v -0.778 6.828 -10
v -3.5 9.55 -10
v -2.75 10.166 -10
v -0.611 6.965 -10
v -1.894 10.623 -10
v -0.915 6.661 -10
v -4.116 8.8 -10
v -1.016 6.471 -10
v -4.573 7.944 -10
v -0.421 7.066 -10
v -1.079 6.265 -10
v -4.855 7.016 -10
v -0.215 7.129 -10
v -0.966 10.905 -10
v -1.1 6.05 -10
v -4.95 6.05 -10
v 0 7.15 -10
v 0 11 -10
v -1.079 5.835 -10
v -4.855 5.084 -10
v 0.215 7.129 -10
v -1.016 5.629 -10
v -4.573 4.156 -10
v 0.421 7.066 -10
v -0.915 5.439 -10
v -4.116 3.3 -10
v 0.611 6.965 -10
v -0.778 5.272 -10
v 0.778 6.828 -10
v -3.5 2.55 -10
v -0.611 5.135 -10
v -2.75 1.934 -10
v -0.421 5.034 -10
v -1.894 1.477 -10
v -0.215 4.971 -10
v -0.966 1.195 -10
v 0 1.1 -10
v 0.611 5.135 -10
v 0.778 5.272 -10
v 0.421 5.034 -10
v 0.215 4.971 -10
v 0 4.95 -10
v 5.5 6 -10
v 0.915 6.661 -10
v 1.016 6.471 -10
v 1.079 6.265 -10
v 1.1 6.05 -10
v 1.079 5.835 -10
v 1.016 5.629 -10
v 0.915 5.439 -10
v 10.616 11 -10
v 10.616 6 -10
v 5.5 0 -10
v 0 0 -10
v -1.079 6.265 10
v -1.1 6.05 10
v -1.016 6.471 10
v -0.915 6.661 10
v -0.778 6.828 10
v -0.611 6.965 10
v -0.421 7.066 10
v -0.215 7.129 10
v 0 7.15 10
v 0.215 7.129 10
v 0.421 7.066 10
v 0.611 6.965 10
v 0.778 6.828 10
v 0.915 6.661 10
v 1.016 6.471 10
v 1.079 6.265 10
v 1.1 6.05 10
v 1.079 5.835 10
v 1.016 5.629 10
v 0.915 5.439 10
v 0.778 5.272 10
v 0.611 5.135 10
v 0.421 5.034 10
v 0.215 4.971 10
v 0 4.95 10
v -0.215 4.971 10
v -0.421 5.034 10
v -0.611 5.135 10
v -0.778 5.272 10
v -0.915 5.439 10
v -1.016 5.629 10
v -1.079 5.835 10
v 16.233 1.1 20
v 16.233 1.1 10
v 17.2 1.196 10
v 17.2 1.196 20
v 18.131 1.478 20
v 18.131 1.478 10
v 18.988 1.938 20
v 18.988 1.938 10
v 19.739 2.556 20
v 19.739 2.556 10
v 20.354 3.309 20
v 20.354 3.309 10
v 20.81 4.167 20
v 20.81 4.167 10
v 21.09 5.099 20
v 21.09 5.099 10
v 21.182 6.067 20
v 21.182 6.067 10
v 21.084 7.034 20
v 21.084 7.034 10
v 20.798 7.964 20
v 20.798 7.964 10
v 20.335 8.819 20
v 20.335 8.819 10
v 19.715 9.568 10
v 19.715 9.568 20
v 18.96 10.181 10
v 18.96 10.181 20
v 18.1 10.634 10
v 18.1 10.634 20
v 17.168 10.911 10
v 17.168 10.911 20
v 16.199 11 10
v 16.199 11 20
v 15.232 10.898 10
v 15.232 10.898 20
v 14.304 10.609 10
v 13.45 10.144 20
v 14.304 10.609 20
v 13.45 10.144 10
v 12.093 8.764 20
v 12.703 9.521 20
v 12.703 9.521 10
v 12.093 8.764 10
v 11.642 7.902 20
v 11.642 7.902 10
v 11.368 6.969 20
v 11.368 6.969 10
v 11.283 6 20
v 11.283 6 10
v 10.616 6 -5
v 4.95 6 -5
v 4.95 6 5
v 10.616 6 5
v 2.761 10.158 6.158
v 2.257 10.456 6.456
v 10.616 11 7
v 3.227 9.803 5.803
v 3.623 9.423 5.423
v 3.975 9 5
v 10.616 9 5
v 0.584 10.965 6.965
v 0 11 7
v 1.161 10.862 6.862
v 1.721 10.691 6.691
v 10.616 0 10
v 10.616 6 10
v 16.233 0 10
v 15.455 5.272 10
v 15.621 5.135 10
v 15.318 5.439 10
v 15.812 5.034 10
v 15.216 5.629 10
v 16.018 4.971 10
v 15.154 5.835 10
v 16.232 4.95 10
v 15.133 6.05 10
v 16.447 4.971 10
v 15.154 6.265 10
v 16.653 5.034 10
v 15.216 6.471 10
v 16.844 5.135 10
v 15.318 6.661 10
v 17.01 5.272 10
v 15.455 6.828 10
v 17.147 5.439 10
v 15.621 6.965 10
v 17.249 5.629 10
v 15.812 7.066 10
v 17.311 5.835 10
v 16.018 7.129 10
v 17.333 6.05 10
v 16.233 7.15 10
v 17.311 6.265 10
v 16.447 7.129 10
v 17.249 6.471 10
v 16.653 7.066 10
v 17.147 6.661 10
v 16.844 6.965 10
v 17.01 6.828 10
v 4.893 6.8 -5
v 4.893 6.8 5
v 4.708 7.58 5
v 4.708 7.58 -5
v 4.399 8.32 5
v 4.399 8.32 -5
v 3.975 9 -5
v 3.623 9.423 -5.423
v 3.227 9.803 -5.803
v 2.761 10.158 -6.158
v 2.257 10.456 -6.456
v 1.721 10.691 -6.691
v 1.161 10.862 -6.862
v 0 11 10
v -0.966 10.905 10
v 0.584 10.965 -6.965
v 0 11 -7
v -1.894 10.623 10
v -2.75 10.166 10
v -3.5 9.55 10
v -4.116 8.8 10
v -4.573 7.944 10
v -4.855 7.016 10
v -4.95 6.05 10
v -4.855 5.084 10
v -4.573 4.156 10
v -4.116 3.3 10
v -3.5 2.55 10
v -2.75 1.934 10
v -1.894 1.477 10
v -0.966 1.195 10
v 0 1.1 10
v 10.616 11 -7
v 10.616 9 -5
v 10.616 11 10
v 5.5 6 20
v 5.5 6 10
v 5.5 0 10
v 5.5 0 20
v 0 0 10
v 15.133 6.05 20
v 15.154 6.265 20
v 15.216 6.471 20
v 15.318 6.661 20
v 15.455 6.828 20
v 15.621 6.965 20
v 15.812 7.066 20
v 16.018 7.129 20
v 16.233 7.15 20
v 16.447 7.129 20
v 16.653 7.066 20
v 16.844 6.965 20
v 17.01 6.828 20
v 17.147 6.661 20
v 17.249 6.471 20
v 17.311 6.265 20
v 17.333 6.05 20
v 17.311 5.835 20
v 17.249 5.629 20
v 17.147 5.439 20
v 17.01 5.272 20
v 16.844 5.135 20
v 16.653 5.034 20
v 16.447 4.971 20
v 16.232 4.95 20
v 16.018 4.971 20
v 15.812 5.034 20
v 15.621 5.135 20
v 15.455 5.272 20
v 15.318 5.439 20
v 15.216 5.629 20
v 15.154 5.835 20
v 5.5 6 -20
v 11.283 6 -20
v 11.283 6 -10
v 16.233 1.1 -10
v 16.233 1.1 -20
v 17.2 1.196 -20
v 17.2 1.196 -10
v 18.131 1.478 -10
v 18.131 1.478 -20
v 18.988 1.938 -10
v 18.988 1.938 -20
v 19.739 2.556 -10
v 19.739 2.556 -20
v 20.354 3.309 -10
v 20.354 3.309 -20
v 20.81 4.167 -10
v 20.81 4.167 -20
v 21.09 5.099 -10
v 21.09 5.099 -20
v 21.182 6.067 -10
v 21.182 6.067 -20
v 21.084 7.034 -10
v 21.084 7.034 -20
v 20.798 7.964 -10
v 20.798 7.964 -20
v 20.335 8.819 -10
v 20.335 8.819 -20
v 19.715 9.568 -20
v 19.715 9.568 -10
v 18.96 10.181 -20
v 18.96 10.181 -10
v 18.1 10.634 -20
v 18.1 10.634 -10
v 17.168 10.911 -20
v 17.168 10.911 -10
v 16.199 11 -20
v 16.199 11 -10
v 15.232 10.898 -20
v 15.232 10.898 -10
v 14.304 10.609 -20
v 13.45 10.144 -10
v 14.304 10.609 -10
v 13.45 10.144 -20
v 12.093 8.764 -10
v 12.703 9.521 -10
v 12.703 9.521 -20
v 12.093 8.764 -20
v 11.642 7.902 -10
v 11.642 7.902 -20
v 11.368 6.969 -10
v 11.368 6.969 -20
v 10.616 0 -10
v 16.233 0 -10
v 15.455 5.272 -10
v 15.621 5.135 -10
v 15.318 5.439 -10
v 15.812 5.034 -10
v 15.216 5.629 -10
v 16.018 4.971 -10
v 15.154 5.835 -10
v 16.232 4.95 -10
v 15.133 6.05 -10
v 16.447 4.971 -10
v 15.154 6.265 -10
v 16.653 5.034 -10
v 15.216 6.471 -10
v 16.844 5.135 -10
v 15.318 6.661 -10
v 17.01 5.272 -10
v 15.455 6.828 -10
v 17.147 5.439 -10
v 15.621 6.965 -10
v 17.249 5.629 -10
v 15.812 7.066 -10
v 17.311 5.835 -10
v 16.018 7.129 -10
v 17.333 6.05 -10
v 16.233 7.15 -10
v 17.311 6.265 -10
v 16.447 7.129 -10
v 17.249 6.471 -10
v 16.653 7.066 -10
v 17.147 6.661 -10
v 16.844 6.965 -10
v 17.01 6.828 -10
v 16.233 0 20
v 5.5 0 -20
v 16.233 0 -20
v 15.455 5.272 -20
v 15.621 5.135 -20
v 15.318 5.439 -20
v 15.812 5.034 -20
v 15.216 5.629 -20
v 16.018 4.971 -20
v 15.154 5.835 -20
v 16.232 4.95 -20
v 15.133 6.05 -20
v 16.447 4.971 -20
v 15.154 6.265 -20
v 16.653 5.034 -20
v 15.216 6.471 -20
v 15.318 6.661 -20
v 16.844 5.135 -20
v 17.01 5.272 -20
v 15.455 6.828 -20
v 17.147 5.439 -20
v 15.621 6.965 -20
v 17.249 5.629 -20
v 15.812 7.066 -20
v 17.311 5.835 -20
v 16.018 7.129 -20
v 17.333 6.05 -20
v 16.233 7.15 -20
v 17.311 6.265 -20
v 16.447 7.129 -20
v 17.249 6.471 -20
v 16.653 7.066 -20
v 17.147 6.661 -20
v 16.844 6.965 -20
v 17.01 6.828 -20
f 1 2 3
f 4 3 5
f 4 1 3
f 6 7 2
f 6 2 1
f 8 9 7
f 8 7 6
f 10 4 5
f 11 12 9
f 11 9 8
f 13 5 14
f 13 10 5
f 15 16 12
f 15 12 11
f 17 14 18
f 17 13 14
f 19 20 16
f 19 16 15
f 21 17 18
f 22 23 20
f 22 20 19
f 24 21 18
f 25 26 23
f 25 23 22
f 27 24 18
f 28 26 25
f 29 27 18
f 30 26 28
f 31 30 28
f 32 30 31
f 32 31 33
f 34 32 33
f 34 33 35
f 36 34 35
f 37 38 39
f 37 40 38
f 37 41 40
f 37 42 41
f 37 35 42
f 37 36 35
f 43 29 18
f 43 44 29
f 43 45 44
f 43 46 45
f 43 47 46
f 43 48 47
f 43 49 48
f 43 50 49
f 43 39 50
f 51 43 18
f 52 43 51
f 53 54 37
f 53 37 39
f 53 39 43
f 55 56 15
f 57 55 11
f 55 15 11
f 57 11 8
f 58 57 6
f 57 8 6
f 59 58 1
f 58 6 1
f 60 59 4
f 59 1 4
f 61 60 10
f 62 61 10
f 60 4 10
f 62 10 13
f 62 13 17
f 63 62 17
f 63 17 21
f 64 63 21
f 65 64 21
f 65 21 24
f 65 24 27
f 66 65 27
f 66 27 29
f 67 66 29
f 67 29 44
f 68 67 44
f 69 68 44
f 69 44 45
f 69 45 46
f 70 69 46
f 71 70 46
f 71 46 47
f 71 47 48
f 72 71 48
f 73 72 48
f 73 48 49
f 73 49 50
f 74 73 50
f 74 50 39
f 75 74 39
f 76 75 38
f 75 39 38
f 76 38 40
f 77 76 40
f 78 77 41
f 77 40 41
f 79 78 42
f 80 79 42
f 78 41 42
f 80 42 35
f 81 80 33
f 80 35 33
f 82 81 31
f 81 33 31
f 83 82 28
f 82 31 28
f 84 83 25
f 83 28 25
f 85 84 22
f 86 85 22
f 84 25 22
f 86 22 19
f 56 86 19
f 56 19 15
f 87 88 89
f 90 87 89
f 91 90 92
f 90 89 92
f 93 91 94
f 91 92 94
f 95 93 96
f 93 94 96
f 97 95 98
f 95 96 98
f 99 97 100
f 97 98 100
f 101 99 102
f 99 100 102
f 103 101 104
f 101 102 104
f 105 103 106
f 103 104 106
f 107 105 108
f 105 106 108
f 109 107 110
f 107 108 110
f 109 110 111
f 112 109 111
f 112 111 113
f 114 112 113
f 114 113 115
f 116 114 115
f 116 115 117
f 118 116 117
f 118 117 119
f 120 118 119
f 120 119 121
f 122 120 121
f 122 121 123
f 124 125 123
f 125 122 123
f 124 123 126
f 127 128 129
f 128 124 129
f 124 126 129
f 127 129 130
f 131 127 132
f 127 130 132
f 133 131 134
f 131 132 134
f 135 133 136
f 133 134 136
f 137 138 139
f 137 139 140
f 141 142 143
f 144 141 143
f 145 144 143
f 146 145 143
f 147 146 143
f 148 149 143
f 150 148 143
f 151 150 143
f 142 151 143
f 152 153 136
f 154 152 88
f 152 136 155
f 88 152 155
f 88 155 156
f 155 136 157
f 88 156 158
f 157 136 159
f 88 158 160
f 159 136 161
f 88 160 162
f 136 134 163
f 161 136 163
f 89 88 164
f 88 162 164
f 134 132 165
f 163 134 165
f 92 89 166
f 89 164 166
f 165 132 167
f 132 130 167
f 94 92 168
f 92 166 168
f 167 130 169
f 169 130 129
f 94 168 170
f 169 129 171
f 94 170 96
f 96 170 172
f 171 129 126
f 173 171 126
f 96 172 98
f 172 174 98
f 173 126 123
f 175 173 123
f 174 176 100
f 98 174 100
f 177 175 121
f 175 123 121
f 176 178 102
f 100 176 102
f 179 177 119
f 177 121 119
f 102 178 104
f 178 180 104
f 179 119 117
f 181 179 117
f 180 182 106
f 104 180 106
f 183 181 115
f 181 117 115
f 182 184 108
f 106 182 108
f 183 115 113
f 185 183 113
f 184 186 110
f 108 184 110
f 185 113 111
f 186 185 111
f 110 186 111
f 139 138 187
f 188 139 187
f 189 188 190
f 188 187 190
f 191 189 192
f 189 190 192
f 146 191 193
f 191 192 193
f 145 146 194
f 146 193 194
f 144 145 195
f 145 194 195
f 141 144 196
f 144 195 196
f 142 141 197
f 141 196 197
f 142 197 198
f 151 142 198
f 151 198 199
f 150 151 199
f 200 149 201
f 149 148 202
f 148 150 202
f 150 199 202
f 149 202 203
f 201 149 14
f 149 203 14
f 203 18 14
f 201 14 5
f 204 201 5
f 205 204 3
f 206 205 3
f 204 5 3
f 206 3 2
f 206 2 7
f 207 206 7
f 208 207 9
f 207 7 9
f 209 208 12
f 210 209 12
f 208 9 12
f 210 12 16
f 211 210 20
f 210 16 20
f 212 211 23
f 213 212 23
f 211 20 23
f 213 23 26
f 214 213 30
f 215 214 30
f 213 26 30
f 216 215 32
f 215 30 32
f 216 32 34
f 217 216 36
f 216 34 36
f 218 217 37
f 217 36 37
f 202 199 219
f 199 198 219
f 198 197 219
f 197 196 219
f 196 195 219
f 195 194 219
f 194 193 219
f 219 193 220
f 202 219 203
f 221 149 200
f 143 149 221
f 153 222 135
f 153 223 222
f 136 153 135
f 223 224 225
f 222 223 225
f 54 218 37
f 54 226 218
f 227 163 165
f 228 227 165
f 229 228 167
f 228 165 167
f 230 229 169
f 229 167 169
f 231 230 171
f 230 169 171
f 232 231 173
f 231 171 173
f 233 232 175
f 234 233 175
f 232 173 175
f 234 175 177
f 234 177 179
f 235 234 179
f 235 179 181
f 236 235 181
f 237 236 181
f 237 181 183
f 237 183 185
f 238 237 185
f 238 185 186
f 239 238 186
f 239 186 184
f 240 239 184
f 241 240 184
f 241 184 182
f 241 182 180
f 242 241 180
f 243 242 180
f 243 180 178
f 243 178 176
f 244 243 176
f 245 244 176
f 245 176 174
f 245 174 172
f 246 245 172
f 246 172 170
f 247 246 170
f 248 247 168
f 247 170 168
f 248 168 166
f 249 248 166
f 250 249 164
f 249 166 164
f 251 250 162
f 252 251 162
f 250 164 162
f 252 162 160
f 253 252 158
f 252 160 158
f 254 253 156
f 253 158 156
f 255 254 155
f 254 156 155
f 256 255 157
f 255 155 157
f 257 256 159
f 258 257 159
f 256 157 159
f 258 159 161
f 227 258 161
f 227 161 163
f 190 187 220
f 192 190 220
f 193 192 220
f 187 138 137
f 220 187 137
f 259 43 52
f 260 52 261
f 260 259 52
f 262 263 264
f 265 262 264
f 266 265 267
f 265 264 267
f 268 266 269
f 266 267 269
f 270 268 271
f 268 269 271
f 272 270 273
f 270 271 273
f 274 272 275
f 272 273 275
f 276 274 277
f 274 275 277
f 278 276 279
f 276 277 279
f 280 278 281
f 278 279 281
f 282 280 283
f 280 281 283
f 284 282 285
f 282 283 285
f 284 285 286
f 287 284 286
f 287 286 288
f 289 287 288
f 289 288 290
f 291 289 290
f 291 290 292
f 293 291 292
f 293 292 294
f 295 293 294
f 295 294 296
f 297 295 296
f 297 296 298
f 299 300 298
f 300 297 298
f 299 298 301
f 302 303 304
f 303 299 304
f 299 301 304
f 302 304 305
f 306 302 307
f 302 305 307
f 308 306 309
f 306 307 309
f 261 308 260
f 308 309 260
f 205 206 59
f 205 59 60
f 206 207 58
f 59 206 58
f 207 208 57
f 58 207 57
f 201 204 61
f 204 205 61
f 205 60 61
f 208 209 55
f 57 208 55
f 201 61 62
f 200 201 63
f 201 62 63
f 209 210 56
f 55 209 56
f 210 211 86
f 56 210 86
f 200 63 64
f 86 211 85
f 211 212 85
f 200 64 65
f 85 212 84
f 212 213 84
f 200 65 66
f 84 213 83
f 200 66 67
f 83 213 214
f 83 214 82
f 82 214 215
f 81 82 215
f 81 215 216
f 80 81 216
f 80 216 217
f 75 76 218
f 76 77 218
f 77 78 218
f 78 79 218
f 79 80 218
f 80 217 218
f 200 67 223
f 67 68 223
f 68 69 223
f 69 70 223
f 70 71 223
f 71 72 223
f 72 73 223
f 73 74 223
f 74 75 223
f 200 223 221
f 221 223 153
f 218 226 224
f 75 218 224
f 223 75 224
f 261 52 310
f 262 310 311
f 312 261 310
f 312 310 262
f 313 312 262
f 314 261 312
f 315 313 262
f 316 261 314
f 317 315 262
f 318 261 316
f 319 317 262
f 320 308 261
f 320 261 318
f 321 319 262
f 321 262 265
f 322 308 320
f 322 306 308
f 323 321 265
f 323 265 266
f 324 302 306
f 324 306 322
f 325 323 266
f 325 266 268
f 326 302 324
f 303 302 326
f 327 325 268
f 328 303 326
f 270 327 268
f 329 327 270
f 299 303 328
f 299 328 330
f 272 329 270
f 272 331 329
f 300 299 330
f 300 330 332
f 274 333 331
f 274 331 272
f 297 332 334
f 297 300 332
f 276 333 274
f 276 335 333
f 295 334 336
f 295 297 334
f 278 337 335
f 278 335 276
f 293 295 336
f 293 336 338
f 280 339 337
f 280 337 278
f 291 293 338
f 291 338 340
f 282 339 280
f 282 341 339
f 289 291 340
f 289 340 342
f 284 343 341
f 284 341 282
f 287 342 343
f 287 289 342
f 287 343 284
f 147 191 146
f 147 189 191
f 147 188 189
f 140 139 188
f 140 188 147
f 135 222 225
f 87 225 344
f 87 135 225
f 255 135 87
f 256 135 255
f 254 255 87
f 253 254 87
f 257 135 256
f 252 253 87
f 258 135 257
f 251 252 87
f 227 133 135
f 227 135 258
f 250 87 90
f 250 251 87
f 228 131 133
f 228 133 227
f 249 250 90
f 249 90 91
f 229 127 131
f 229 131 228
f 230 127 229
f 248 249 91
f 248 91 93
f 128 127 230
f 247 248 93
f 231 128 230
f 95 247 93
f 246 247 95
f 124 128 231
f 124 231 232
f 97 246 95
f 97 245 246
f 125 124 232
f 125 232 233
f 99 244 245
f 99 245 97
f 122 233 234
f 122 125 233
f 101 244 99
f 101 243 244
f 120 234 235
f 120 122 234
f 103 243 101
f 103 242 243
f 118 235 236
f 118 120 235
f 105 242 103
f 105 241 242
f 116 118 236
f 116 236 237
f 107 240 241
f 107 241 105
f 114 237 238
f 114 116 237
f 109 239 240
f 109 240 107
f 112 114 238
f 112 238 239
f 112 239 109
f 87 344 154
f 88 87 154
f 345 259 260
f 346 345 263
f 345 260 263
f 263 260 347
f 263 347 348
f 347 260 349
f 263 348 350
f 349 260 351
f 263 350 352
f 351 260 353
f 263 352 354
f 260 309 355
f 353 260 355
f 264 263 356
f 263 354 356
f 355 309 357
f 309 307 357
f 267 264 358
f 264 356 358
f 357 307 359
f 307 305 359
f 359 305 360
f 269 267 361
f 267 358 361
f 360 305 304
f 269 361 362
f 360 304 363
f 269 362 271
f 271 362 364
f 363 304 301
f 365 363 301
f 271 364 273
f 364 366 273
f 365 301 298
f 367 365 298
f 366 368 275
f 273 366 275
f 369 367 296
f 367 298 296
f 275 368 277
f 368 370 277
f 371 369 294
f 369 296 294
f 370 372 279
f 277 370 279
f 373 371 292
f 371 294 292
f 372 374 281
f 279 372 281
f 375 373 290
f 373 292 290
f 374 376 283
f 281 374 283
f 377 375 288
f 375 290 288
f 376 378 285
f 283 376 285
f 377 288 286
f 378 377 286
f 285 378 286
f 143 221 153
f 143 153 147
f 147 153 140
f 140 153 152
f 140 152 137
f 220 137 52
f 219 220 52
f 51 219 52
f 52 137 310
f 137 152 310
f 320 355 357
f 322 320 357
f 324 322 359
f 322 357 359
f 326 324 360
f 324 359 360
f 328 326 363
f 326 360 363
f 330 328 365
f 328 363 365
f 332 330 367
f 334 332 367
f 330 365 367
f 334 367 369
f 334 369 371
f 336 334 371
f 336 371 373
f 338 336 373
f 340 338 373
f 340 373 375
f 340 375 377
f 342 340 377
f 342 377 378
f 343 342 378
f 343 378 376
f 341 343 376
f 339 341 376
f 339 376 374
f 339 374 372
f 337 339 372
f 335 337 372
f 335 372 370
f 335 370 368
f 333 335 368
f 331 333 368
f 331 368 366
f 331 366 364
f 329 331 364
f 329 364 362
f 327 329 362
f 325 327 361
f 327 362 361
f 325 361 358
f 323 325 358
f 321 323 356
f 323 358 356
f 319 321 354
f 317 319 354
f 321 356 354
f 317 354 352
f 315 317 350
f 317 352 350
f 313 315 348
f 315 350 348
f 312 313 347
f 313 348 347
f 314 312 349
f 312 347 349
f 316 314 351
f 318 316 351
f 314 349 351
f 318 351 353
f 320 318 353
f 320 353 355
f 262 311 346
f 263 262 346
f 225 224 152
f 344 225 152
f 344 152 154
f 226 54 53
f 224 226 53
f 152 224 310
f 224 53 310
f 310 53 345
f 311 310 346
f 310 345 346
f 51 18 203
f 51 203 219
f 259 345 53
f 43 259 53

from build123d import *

# Parameters (mm, degrees)
BOSS_EXTRUDE1_DEPTH   = 6
SKETCH2_W             = 10.6165
SKETCH2_H             = 5
BOSS_EXTRUDE2_DEPTH   = 5
CHAMFER1_SIZE         = 2
BOSS_EXTRUDE3_START   = -10
SKETCH3_R             = 4.95
BOSS_EXTRUDE3_DEPTH   = 20
BOSS_EXTRUDE4_START   = 10
SKETCH3_3_R           = 4.95
BOSS_EXTRUDE4_DEPTH   = 10
BOSS_EXTRUDE5_START   = -20
SKETCH3_4_R           = 4.95
BOSS_EXTRUDE5_DEPTH   = 10
F_1_0MM_DOWEL_HOLE1_D = 2.2


with BuildPart() as part:
    # Sketch1 → Boss-Extrude1 (new body)
    with BuildSketch(Plane(origin=(0, 0, 0), x_dir=(1, 0, 0), z_dir=(0, 1, 0))):
        Polygon((16.2325, -10), (10.6165, -10), (5.5005, -10), (5.5005, -20), (16.2325, -20), align=None)
        Polygon((10.6165, 0), (0, 0), (0, -10), (5.5005, -10), (10.6165, -10), align=None)
        Polygon((0, 10), (0, 0), (10.6165, 0), (10.6165, 10), (5.5005, 10), align=None)
        Polygon((5.5005, 10), (10.6165, 10), (16.2325, 10), (16.2325, 20), (5.5005, 20), align=None)
    extrude(amount=BOSS_EXTRUDE1_DEPTH)

    # Sketch2 → Boss-Extrude2 (add)
    with BuildSketch(Plane(origin=(0, 6, 0), x_dir=(1, 0, 0), z_dir=(0, 1, 0))):
        with Locations((5.30825, 7.5)):
            Rectangle(SKETCH2_W, SKETCH2_H)
        with Locations((5.30825, -7.5)):
            Rectangle(SKETCH2_W, SKETCH2_H)
    extrude(amount=BOSS_EXTRUDE2_DEPTH)

    # Chamfer1
    chamfer1_edges = [part.edges().sort_by_distance(p)[0] for p in [
        (5.30825, 11, -5),
        (5.30825, 11, 5),
    ]]
    chamfer(chamfer1_edges, length=CHAMFER1_SIZE)

    # Sketch3 → Boss-Extrude3 (add)
    with BuildSketch(Plane.XY.offset(BOSS_EXTRUDE3_START)):
        with Locations((0, 6.05)):
            Circle(SKETCH3_R)
    extrude(amount=BOSS_EXTRUDE3_DEPTH)

    # Sketch3<3> → Boss-Extrude4 (add)
    with BuildSketch(Plane.XY.offset(BOSS_EXTRUDE4_START)):
        with Locations((16.2325, 6.05)):
            Circle(SKETCH3_3_R)
    extrude(amount=BOSS_EXTRUDE4_DEPTH)

    # Sketch3<4> → Boss-Extrude5 (add)
    with BuildSketch(Plane.XY.offset(BOSS_EXTRUDE5_START)):
        with Locations((16.2325, 6.05)):
            Circle(SKETCH3_4_R)
    extrude(amount=BOSS_EXTRUDE5_DEPTH)

    # Ø1.0mm Dowel Hole1 (through all)
    with Locations(Plane.XY.offset(20)):
        with Locations((0, 6.05), (16.2325, 6.05)):
            Hole(F_1_0MM_DOWEL_HOLE1_D / 2)


solid = part.part
